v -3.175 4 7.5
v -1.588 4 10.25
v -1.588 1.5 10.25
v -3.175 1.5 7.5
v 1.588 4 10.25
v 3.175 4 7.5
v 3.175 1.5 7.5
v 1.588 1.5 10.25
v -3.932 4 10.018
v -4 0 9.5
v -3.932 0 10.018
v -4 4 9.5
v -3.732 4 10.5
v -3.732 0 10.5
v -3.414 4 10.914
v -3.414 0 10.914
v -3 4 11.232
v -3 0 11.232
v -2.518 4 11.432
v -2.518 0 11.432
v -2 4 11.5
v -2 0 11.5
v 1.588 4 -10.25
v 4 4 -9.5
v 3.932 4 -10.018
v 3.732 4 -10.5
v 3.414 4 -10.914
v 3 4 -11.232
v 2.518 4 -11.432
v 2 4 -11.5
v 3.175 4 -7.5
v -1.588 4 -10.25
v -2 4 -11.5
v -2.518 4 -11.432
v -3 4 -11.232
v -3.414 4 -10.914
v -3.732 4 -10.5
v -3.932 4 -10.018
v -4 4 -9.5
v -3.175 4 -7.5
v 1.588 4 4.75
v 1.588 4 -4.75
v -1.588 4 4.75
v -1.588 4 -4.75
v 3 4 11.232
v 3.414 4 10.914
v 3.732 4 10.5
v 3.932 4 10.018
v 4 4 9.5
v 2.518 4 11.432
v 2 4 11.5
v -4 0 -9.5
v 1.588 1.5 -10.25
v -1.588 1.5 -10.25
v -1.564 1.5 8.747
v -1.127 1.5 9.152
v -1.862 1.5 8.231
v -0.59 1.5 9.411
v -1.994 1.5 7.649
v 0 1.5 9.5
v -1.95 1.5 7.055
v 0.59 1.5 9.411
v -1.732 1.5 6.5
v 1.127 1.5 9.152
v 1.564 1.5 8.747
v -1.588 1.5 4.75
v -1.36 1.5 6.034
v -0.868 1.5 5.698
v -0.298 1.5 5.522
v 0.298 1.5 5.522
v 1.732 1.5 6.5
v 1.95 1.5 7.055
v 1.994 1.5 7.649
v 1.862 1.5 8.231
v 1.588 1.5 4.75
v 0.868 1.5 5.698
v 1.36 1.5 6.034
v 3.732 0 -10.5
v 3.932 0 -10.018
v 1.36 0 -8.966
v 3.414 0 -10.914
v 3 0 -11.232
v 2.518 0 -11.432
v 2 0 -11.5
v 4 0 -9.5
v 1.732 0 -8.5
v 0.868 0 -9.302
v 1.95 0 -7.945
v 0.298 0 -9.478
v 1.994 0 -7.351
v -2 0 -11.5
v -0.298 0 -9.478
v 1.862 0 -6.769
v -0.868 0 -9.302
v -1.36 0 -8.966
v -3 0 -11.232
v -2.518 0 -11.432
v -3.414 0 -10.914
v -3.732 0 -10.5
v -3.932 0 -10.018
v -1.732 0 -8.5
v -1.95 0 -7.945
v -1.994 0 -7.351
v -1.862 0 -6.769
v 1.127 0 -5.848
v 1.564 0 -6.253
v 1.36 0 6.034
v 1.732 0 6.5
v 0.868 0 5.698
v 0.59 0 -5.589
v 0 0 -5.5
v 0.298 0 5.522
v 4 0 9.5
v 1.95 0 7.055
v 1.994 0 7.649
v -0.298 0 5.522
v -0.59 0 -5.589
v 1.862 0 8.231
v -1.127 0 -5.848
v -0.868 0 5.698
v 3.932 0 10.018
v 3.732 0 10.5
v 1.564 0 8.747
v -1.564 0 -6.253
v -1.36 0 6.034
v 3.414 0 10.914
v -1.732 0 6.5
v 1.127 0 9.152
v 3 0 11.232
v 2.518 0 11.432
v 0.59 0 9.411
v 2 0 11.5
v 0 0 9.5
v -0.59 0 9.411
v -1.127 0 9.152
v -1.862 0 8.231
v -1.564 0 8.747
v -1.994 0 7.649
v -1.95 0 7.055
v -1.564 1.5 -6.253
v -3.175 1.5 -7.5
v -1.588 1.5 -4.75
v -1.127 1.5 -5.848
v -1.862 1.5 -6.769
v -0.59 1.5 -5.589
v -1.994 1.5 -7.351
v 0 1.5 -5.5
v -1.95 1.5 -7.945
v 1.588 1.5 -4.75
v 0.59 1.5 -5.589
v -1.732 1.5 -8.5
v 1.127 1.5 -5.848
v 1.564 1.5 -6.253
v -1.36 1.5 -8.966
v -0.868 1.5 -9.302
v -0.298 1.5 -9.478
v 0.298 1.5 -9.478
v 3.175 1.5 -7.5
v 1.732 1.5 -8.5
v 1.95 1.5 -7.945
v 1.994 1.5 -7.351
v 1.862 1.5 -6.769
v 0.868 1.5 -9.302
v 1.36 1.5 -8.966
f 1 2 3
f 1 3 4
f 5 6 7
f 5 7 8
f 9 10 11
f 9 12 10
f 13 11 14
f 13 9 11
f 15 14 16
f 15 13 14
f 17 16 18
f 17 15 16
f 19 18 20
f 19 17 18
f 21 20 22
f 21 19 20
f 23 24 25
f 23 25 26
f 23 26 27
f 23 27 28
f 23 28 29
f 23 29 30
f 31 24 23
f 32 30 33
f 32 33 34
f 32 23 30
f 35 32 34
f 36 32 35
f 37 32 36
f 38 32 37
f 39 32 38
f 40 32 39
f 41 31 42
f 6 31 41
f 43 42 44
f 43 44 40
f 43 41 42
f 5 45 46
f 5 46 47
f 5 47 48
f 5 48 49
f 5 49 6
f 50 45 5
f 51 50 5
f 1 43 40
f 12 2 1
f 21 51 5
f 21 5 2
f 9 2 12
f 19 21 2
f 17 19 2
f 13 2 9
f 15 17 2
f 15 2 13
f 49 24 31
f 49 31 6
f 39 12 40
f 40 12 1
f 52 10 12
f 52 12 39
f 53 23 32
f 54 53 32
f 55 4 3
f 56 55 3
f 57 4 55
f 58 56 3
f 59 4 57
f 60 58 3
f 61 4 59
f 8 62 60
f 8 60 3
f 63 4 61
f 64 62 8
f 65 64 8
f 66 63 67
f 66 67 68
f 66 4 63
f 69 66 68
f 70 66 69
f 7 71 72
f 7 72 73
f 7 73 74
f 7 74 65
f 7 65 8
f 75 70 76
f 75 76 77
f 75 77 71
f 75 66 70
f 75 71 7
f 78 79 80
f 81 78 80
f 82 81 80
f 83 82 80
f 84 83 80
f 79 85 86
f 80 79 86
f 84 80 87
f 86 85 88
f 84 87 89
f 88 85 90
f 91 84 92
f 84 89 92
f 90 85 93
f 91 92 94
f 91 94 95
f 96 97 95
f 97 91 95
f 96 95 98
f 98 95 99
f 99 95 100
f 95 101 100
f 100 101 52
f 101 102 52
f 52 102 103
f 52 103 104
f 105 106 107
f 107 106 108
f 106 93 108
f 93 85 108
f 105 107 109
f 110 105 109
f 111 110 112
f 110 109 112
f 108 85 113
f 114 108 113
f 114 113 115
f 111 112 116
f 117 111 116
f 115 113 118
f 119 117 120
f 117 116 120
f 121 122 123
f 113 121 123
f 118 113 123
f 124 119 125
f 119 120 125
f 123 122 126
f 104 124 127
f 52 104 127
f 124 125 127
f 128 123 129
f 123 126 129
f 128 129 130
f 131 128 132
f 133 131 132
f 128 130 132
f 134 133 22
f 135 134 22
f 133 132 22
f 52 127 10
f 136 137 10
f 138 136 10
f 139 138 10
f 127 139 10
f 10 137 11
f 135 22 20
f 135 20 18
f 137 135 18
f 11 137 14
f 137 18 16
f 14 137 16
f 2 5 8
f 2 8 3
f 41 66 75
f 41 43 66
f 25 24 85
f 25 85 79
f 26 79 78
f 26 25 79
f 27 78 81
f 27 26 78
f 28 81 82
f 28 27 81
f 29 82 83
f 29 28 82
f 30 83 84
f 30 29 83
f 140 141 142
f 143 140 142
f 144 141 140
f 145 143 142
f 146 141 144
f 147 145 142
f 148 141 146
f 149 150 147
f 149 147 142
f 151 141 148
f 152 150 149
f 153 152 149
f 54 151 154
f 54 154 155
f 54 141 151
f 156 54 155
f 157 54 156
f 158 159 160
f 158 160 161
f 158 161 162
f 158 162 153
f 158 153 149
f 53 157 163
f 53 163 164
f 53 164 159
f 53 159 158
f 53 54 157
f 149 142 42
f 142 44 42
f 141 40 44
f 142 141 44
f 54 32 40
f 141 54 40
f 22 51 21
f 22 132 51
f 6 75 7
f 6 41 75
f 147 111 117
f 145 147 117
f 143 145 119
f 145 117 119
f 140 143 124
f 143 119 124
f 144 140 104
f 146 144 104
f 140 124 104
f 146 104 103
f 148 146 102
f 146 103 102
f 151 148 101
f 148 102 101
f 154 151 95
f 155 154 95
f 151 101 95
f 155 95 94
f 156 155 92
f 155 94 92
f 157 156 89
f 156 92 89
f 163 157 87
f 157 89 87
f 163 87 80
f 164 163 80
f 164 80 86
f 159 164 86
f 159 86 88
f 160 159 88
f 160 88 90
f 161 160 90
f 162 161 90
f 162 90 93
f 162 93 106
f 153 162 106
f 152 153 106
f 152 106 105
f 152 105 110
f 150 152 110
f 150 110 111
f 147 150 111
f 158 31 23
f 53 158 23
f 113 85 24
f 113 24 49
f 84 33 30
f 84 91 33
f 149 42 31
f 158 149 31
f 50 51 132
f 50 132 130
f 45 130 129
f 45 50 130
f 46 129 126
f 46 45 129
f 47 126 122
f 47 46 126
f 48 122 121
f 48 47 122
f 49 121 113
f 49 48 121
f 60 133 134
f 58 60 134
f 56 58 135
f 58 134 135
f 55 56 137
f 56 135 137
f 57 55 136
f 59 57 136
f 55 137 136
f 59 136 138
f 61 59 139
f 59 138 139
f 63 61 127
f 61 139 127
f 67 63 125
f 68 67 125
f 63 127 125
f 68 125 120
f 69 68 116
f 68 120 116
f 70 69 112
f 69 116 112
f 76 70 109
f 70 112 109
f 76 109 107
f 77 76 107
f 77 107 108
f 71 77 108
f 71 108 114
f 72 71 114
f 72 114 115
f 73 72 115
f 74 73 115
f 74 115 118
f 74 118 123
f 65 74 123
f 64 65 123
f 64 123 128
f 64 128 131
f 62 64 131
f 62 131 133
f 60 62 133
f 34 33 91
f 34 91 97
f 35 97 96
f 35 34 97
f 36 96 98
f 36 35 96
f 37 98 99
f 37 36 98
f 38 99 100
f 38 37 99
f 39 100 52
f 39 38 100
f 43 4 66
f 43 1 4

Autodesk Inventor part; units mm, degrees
ref_plane "YZ Plane" through (0, 0, 0) normal (1, 0, 0) x (0, 1, 0)
ref_plane "XZ Plane" through (0, 0, 0) normal (0, 1, 0) x (-1, 0, 0)
ref_plane "XY Plane" through (0, 0, 0) normal (0, 0, 1) x (1, 0, 0)
sketch "Sketch1" plane through (0, 0, 0) normal (0, 1, 0) x (-1, 0, 0)
  line L0 (-4, 11.5) -> (4, 11.5)
  line L1 (4, 11.5) -> (4, -11.5)
  line L2 (4, -11.5) -> (-4, -11.5)
  line L3 (-4, -11.5) -> (-4, 11.5)
  line L4 (-4, 11.5) -> (4, -11.5) construction
  line L5 (4, 11.5) -> (-4, -11.5) construction
  point P0 (0, 0)
  dimension "d0" = 8
  dimension "d1" = 23
extrude "Extrusion1" add sketch "Sketch1" along normal blind 4
sketch "Sketch2" plane through (0, 4, 0) normal (0, 1, 0) x (1, 0, 0)
  line L0 (3.1754, -7.5) -> (1.5877, -10.25)
  line L1 (1.5877, -10.25) -> (-1.5877, -10.25)
  line L2 (-1.5877, -10.25) -> (-3.1754, -7.5)
  line L3 (-3.1754, -7.5) -> (-1.5877, -4.75)
  line L4 (-1.5877, -4.75) -> (1.5877, -4.75)
  line L5 (1.5877, -4.75) -> (3.1754, -7.5)
  line L6 (-4, -11.5) -> (4, -11.5) projected
  line L7 (-4, 11.5) -> (-4, -11.5) projected
  line L8 (-4, 0) -> (4, 0)
  line L9 (3.1754, 7.5) -> (1.5877, 10.25)
  line L10 (1.5877, 10.25) -> (-1.5877, 10.25)
  line L11 (-1.5877, 10.25) -> (-3.1754, 7.5)
  line L12 (-3.1754, 7.5) -> (-1.5877, 4.75)
  line L13 (-1.5877, 4.75) -> (1.5877, 4.75)
  line L14 (1.5877, 4.75) -> (3.1754, 7.5)
  point P0 (0, 0)
  point P1 (0, -7.5)
  dimension "d4" = 0
  dimension "d5" = 7.5
  dimension "d6" = 5.5
extrude "Extrusion2" cut sketch "Sketch2" against normal blind 2.5
fillet "Fillet1" radius 2 4 edges at (4, 2, 11.5) (-4, 2, 11.5) (4, 2, -11.5) (-4, 2, -11.5)
sketch "Sketch3" plane through (0, 1.5, 0) normal (0, 1, 0) x (1, 0, 0)
  line L0 (3.1754, -7.5) -> (1.5877, -10.25) projected
  line L1 (1.5877, -4.75) -> (3.1754, -7.5) projected
  line L2 (-1.5877, -4.75) -> (1.5877, -4.75) projected
  line L3 (-3.1754, -7.5) -> (-1.5877, -4.75) projected
  line L4 (-1.5877, -10.25) -> (-3.1754, -7.5) projected
  line L5 (1.5877, -10.25) -> (-1.5877, -10.25) projected
  line L6 (-3.1754, 7.5) -> (-1.5877, 10.25) projected
  line L7 (-1.5877, 4.75) -> (-3.1754, 7.5) projected
  line L8 (1.5877, 4.75) -> (-1.5877, 4.75) projected
  line L9 (3.1754, 7.5) -> (1.5877, 4.75) projected
  line L10 (1.5877, 10.25) -> (3.1754, 7.5) projected
  line L11 (-1.5877, 10.25) -> (1.5877, 10.25) projected
  point P0 (0, 0)
  point P1 (0, -7.5)
  point P2 (0, 7.5)
  dimension "d17" = 2.75
  dimension "d18" = 2.75
hole "Hole1" at (0, 1.5, 7.5) at (0, 1.5, -7.5) direction (0, -1, 0) diameter 4 end through all
properties part number "connector_brace"
